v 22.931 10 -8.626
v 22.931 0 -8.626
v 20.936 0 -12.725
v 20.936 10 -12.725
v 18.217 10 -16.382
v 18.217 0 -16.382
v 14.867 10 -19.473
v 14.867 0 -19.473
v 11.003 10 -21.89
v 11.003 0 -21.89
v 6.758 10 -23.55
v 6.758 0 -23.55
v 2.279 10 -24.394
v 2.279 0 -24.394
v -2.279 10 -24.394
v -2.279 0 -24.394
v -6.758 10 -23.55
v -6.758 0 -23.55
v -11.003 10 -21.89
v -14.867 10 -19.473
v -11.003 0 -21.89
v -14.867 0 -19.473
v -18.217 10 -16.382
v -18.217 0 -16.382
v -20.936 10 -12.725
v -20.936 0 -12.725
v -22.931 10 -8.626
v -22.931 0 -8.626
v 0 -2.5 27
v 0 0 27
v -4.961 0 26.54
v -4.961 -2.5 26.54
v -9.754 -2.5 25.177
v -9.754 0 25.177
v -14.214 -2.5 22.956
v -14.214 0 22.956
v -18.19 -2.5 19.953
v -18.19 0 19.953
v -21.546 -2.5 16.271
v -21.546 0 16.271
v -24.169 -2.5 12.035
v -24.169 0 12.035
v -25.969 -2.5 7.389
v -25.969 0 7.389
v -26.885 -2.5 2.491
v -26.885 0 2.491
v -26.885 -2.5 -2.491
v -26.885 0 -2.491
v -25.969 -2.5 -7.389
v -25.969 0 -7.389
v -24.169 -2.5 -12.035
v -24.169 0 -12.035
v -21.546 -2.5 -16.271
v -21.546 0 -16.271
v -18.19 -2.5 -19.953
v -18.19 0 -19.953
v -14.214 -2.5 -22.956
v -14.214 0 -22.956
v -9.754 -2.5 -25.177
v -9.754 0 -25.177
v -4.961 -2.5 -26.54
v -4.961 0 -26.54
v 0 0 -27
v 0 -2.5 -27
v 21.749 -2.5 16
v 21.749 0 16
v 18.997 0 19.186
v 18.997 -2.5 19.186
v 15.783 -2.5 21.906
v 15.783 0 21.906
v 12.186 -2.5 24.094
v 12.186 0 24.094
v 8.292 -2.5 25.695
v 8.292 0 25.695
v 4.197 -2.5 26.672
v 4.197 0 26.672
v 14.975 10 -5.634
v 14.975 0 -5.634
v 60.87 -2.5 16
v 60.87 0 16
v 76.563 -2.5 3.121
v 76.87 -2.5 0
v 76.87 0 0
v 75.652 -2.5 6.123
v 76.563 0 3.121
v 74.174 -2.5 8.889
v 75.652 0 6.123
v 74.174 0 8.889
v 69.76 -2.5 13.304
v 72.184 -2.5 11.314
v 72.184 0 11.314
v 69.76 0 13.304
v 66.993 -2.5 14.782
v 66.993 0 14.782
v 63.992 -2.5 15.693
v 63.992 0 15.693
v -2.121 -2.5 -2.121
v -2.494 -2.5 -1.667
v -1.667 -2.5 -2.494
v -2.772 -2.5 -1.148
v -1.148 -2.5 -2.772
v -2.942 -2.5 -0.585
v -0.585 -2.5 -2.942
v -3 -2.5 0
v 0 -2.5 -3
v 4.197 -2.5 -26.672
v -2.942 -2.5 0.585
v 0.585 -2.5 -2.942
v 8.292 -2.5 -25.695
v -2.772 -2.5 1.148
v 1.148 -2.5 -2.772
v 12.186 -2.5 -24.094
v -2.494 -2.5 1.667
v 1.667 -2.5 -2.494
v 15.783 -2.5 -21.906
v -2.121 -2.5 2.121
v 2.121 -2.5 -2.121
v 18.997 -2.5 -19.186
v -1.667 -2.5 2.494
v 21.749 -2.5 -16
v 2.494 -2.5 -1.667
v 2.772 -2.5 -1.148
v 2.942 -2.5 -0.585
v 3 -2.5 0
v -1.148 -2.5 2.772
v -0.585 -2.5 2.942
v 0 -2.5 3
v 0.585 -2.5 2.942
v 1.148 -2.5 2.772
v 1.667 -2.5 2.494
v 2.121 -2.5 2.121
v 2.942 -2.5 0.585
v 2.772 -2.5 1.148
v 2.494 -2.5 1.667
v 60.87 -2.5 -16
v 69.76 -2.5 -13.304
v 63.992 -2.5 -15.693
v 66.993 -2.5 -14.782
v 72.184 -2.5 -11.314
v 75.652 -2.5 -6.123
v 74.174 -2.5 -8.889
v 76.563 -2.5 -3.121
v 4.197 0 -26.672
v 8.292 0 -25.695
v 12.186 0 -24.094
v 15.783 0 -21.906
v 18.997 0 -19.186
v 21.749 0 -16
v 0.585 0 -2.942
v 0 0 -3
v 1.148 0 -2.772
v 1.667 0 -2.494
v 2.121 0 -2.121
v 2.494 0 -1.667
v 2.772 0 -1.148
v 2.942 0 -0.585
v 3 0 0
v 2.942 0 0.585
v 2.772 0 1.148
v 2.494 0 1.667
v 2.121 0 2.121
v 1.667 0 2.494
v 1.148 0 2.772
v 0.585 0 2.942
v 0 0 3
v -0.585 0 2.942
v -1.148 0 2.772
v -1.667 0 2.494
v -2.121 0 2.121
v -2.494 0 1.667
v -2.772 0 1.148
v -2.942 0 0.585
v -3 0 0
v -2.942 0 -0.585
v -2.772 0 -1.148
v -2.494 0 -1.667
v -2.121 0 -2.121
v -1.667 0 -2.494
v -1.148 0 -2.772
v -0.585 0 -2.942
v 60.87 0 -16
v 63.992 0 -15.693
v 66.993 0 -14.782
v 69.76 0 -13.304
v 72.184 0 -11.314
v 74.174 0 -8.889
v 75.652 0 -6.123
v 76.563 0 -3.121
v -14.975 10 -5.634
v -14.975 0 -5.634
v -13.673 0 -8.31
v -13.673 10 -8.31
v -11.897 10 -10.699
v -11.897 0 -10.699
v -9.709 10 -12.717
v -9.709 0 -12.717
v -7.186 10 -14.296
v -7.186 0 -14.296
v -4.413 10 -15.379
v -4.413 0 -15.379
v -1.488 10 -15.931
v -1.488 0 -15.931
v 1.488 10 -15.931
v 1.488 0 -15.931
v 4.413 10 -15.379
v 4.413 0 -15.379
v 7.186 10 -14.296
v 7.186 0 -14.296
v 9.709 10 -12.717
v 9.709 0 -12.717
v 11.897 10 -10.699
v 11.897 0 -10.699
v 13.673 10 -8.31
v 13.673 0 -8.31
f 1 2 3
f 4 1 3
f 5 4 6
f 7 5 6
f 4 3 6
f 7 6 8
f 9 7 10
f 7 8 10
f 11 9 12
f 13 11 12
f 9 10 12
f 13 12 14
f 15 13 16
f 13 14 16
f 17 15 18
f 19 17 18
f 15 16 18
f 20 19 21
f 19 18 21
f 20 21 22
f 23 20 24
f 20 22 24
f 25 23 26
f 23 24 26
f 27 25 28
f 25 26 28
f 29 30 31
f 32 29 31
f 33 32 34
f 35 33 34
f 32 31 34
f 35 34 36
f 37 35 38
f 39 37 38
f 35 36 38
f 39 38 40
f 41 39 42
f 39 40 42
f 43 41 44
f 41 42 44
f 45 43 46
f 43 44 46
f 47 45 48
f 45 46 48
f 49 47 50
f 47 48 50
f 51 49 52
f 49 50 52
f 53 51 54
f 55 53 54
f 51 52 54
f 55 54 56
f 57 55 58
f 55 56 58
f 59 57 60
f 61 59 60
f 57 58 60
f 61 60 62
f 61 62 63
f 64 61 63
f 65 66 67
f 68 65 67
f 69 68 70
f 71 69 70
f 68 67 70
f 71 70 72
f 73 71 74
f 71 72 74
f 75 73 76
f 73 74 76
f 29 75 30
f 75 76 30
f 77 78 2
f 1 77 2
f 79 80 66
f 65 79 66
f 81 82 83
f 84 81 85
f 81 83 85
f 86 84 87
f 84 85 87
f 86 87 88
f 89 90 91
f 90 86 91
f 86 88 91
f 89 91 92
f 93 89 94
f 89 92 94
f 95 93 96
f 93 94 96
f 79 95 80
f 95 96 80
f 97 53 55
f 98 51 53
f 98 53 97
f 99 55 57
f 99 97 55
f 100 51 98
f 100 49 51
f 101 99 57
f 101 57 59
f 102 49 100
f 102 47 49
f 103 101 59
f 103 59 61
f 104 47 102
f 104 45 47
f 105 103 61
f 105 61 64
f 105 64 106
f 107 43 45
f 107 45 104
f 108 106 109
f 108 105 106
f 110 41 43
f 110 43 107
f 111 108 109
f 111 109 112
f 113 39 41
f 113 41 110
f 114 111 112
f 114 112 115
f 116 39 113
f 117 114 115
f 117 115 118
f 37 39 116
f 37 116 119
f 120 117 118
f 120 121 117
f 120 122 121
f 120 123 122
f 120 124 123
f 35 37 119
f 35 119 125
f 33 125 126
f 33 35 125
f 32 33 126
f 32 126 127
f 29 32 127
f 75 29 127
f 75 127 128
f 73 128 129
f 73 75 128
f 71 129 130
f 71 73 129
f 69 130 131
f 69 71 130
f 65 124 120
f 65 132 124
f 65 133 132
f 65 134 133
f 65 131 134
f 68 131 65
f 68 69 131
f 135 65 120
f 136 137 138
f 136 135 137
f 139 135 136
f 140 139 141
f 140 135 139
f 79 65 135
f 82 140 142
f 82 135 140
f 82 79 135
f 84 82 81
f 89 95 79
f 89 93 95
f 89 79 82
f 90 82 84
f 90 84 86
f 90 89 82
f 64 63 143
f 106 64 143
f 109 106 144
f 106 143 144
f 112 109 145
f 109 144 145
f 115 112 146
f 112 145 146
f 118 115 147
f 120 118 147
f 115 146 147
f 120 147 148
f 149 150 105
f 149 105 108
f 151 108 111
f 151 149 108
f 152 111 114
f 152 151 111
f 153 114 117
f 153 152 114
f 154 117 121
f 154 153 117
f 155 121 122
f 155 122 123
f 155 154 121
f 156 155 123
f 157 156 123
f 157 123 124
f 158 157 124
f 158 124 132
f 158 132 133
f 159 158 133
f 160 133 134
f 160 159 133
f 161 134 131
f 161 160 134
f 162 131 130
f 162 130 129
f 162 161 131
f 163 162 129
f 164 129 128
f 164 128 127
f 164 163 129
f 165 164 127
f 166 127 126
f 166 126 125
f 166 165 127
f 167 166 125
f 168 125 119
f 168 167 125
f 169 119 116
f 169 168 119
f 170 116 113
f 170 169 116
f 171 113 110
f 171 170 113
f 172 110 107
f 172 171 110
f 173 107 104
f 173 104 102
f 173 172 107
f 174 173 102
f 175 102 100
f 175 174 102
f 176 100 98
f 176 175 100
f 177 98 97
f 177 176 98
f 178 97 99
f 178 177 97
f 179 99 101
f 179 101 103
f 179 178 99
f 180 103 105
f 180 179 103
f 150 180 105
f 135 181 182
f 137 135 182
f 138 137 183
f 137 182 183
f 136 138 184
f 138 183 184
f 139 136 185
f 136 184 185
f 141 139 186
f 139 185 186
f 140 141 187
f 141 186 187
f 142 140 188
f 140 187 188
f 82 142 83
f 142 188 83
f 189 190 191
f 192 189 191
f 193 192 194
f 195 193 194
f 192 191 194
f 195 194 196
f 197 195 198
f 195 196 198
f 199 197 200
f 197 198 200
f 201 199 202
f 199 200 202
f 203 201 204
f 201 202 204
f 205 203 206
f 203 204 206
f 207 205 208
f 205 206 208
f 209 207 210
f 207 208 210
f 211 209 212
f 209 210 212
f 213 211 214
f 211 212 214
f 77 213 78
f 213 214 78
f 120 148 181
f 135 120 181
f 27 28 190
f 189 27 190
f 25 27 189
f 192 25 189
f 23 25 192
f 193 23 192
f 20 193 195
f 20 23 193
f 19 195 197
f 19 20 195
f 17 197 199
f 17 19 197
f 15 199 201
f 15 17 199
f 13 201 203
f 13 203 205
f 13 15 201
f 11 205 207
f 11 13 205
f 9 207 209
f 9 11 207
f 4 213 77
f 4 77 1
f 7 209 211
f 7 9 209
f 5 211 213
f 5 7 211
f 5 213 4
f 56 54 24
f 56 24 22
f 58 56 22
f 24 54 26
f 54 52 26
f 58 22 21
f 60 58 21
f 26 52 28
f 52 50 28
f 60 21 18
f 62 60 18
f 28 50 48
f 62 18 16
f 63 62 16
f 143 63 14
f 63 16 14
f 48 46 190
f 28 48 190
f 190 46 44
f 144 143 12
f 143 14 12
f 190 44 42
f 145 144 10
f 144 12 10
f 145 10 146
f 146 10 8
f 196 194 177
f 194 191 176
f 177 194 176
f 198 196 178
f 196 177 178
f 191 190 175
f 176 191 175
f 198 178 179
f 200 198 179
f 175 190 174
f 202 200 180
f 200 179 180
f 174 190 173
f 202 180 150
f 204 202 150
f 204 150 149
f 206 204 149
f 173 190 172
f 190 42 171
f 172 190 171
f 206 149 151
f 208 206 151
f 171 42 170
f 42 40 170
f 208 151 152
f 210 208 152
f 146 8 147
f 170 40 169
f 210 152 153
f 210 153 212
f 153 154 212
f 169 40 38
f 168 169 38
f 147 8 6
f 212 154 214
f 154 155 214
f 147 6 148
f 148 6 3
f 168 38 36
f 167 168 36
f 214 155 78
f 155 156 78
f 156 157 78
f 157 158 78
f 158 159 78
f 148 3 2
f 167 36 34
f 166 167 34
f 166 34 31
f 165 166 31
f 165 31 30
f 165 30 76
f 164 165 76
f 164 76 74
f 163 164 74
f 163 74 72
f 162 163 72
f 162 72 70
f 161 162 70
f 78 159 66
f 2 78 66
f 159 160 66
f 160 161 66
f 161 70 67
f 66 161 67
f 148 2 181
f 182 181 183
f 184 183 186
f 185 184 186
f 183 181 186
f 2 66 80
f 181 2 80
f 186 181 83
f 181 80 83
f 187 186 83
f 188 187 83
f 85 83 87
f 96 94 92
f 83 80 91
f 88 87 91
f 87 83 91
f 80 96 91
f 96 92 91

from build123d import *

# Parameters (mm, degrees)
BOSS_EXTRUDE1_DEPTH = 10
SKETCH2_R           = 3
BOSS_EXTRUDE2_DEPTH = 2.5
CUT_EXTRUDE1_DEPTH  = 10


with BuildPart() as part:
    # Sketch1 → Boss-Extrude1 (new body)
    with BuildSketch(Plane(origin=(0, 0, 0), x_dir=(1, 0, 0), z_dir=(0, 1, 0))):
        with BuildLine():
            Line((-22.931089862, 8.626419753), (-14.975405624, 5.633580247))
            ThreePointArc((-14.975405624, 5.633580247), (0, 16), (14.975405624, 5.633580247))
            Line((14.975405624, 5.633580247), (22.931089862, 8.626419753))
            ThreePointArc((22.931089862, 8.626419753), (0, 24.5), (-22.931089862, 8.626419753))
        make_face()
    extrude(amount=BOSS_EXTRUDE1_DEPTH)

    # Sketch2 → Boss-Extrude2 (add)
    with BuildSketch(Plane.XZ):
        with BuildLine():
            Line((76.870427411, -16), (76.870427411, 16))
            Line((76.870427411, 16), (21.748563171, 16))
            ThreePointArc((21.748563171, 16), (12.186057607, 24.093567606), (0, 27))
            ThreePointArc((0, 27), (-27, 0), (0, -27))
            ThreePointArc((0, -27), (12.186057607, -24.093567606), (21.748563171, -16))
            Line((21.748563171, -16), (76.870427411, -16))
        make_face()
        with Locations(Location((0, 0, 0), (0, 0, 270))):
            Circle(SKETCH2_R, mode=Mode.SUBTRACT)
    extrude(amount=BOSS_EXTRUDE2_DEPTH)

    # Sketch3 → Cut-Extrude1 (cut)
    with BuildSketch(Plane(origin=(0, 0, 0), x_dir=(1, 0, 0), z_dir=(0, 1, 0))):
        with BuildLine():
            Line((76.870427411, 16), (60.870427411, 16))
            ThreePointArc((60.870427411, 16), (72.184135957, 11.313708452), (76.870427411, -1.33e-07))
            Line((76.870427411, -1.33e-07), (76.870427411, 16))
        make_face()
        with BuildLine():
            Line((76.870427411, -16), (76.870427411, -1.33e-07))
            ThreePointArc((76.870427411, -1.33e-07), (72.184135863, -11.313708546), (60.870427411, -16))
            Line((60.870427411, -16), (76.870427411, -16))
        make_face()
    extrude(amount=-CUT_EXTRUDE1_DEPTH, mode=Mode.SUBTRACT)


solid = part.part
